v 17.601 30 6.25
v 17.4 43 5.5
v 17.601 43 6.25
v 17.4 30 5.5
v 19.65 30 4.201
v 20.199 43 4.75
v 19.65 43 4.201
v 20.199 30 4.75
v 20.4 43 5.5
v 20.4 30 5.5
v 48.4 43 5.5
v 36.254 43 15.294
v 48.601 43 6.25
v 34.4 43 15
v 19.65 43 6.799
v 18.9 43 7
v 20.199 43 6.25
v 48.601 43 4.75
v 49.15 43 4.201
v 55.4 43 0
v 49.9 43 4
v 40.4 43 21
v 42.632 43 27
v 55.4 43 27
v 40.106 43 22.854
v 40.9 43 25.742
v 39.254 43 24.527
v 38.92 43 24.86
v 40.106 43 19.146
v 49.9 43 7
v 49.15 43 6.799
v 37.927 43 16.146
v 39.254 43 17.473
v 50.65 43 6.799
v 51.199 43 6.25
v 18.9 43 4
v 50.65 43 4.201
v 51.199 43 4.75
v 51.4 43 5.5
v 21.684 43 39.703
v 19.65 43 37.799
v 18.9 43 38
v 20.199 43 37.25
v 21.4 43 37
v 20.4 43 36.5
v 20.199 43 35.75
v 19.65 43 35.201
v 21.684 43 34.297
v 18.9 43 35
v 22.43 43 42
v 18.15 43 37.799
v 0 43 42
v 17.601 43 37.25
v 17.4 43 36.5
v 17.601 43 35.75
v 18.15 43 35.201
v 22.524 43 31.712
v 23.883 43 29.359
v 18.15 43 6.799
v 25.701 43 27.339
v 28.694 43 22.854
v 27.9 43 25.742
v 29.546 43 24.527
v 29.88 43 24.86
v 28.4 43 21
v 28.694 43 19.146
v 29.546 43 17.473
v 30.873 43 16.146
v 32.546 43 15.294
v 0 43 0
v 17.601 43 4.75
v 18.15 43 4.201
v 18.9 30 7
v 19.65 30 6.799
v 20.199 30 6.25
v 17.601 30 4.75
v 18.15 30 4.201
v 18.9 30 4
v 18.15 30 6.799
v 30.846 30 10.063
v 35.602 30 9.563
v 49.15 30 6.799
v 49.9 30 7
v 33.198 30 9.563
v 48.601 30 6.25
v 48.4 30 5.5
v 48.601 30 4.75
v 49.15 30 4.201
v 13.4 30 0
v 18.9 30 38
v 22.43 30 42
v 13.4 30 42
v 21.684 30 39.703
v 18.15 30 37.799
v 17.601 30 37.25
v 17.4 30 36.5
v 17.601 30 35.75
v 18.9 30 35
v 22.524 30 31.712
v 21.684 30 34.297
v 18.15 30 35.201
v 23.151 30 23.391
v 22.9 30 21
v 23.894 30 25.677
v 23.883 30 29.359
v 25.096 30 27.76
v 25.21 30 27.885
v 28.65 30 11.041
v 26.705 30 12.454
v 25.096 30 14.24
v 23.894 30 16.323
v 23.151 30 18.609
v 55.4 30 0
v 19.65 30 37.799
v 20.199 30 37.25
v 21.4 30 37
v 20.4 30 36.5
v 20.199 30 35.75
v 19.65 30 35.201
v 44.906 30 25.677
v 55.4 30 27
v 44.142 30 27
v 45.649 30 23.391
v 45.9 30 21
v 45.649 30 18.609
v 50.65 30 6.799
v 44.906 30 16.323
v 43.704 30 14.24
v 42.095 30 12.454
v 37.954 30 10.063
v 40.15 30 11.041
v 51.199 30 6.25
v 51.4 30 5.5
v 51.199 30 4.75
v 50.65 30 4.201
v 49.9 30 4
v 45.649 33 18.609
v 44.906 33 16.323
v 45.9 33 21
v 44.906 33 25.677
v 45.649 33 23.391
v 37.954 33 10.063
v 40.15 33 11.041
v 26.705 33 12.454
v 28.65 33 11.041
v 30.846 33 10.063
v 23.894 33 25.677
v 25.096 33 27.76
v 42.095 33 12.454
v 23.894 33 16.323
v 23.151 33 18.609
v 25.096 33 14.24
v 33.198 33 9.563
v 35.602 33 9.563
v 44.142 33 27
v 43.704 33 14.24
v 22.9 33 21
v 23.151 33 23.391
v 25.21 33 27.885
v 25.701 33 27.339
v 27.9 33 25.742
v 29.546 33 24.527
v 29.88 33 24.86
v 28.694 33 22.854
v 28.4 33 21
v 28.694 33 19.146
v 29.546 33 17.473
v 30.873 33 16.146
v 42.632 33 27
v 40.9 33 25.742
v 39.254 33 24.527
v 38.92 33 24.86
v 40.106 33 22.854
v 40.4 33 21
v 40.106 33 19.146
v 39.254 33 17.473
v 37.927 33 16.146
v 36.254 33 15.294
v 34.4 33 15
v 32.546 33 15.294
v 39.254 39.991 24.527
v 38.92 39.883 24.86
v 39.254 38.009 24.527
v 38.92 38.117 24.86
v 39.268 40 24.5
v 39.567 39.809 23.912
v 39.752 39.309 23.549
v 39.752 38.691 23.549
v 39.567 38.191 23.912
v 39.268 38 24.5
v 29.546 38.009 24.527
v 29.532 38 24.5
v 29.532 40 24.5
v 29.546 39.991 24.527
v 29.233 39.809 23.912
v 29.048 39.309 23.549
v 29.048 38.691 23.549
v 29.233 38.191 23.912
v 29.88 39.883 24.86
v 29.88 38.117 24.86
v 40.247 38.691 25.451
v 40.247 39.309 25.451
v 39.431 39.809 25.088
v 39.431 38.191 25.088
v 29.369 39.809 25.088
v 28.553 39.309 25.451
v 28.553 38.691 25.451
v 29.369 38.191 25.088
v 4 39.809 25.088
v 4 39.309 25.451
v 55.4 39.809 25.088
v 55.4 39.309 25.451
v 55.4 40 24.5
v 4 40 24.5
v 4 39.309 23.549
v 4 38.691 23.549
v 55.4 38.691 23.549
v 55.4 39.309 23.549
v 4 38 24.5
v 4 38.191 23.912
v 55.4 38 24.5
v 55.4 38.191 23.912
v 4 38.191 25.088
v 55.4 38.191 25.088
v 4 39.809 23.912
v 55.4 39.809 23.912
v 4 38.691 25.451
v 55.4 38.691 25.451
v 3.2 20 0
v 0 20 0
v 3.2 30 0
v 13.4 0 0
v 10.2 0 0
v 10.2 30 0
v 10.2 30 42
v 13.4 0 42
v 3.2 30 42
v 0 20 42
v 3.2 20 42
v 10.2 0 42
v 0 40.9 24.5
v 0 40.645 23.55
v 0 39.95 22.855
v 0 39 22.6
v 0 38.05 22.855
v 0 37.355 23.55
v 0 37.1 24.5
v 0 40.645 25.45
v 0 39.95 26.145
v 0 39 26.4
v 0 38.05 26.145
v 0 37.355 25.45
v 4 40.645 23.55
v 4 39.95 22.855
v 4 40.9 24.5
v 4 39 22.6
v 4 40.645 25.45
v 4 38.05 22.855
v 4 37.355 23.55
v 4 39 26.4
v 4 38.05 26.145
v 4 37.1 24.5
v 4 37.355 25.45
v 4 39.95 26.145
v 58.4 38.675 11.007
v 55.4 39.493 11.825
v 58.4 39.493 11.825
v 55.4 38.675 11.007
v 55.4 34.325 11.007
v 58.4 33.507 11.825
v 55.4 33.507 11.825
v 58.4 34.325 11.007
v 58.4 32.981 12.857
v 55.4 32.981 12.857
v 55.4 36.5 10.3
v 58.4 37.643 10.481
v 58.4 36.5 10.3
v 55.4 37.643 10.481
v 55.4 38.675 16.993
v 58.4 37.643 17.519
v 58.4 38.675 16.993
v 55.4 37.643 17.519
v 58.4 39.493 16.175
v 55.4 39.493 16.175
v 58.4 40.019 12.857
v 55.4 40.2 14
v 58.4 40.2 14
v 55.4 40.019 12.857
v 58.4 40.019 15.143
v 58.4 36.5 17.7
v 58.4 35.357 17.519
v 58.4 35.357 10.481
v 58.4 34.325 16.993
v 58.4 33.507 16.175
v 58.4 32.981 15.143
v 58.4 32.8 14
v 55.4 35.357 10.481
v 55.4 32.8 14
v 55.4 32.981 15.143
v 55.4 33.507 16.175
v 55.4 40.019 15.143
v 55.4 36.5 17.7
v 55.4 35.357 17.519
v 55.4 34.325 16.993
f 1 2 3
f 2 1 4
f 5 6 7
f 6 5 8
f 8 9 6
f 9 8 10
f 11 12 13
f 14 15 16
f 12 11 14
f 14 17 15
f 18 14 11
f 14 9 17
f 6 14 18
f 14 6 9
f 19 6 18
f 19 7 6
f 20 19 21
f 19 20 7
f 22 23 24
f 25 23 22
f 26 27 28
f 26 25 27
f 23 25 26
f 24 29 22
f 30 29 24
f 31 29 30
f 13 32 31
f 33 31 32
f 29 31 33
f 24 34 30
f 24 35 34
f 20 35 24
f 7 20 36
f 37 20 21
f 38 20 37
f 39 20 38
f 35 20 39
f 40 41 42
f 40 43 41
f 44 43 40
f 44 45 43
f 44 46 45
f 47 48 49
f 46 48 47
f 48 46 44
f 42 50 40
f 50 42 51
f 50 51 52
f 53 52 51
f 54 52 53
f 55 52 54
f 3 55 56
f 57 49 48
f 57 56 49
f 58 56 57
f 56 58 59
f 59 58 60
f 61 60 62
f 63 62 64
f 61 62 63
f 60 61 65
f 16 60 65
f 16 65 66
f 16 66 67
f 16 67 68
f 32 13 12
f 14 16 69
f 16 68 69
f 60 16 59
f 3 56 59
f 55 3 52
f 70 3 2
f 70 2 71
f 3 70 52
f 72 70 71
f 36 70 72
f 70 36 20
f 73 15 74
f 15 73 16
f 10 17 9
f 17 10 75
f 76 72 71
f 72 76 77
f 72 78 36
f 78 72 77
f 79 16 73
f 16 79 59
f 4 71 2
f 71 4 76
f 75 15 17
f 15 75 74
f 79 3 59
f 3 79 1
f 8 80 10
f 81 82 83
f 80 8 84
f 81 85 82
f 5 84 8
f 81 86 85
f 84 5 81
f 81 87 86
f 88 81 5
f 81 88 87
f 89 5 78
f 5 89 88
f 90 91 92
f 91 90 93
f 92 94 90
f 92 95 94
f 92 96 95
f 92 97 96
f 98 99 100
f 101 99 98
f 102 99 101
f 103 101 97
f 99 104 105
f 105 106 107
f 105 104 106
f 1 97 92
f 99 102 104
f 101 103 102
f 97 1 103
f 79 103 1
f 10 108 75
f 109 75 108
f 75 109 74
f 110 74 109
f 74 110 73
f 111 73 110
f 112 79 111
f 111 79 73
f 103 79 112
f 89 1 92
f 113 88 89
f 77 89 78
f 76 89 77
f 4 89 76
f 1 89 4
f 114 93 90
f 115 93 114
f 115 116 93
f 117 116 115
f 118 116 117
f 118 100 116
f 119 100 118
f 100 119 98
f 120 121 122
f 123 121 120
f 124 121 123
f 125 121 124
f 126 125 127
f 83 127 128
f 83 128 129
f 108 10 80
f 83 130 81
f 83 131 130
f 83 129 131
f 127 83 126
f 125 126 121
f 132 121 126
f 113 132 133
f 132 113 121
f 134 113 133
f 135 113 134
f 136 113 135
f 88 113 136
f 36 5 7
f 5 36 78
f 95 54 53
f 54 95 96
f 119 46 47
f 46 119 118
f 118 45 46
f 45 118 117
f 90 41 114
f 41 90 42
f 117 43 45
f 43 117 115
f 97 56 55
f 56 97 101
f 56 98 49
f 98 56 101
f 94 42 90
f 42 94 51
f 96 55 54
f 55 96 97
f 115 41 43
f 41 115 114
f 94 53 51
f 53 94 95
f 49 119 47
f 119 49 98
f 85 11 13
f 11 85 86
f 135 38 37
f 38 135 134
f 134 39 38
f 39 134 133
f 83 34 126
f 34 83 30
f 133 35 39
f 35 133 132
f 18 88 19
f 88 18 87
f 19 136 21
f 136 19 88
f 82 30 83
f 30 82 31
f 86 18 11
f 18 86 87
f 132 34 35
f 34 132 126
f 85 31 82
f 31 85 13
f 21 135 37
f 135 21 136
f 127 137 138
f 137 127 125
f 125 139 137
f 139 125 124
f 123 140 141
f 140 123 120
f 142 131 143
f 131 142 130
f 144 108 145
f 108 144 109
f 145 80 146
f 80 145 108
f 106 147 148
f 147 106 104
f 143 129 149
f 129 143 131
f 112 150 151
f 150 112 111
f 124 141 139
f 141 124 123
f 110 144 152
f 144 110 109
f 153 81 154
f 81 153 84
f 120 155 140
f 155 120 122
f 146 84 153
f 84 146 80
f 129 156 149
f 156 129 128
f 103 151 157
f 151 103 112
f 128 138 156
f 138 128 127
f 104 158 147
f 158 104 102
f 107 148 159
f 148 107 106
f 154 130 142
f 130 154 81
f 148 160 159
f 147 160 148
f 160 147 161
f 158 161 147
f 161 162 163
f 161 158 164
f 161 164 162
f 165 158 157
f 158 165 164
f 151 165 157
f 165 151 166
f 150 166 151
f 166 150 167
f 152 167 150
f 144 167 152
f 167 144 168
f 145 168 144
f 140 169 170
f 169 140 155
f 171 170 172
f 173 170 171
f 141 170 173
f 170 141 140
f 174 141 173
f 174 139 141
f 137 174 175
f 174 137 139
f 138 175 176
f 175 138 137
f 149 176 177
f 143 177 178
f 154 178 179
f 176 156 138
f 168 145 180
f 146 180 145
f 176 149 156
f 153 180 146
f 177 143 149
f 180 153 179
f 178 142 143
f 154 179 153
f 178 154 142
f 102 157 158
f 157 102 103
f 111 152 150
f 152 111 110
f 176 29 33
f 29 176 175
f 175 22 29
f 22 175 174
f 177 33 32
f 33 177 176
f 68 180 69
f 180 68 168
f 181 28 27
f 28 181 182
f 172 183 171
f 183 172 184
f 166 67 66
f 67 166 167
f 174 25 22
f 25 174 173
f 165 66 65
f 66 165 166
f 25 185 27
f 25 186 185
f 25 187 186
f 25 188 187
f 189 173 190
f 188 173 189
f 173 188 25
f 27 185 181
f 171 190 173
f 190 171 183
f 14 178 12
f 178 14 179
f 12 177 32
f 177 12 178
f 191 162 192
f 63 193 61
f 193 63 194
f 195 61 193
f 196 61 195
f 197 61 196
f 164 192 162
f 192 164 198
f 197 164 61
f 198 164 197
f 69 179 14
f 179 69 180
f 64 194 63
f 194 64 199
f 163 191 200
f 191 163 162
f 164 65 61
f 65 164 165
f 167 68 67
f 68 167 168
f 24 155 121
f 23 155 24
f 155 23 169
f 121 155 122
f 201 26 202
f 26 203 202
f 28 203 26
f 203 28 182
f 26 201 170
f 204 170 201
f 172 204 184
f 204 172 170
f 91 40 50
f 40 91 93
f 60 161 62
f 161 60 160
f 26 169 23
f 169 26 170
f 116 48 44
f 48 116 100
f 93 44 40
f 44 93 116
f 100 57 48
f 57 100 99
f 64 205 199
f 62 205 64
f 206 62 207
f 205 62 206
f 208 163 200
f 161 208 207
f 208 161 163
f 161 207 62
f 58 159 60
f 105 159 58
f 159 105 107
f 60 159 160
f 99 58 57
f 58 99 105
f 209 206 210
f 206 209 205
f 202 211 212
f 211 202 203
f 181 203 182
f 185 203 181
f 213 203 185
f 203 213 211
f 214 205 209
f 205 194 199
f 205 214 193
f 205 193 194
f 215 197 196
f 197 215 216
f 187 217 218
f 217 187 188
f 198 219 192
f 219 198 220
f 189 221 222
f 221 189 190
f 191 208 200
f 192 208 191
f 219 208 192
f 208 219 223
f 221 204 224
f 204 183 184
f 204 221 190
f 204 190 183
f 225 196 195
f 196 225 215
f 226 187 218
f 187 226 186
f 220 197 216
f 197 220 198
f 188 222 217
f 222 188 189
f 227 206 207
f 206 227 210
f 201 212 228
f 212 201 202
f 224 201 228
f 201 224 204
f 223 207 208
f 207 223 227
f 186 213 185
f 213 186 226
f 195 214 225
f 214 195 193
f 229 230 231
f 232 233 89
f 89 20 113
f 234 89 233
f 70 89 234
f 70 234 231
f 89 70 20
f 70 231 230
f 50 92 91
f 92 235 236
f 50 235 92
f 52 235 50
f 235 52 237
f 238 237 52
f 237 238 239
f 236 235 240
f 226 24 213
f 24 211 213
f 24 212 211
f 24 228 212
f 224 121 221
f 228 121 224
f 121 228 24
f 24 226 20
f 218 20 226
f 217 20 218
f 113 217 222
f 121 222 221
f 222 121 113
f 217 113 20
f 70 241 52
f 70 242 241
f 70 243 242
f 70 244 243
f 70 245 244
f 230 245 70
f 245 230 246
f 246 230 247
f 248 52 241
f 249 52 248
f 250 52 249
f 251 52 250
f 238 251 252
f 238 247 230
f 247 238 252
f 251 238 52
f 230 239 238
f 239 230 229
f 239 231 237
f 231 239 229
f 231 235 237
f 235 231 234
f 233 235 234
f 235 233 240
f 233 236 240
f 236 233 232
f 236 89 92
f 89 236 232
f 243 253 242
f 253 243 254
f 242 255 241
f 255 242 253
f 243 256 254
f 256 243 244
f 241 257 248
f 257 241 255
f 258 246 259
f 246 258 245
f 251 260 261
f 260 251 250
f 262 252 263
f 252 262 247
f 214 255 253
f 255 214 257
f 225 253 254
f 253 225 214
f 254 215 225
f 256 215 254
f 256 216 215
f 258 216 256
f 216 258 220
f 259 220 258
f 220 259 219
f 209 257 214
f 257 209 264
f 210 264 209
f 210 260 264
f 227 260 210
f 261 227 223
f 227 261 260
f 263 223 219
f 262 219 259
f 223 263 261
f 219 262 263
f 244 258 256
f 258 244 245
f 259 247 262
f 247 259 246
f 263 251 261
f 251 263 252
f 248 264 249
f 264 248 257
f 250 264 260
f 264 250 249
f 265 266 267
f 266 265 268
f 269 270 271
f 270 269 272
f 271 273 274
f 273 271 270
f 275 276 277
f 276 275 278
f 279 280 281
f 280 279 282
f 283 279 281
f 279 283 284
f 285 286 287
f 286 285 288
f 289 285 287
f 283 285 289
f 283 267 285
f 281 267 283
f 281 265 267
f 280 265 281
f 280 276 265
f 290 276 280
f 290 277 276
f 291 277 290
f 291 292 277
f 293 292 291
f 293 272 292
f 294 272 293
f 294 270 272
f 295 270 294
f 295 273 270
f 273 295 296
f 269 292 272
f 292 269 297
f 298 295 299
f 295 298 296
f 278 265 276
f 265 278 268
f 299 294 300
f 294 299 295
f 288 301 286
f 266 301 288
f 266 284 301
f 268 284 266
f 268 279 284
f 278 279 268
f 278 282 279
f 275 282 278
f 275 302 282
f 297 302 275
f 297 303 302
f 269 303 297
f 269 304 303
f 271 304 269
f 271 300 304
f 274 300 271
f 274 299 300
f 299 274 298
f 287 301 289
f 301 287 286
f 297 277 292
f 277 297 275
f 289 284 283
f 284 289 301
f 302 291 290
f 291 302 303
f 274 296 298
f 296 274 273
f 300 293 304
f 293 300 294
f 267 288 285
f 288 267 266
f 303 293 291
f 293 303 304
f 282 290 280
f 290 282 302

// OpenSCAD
/*

		A B	  C  D
	| a|b|	c |d |
	 __________ 		_		_E
	|		     |		e		
	|--	 _	-- __|		_-- EM	_
	|	| |	  |			f		 F
	|__	| |	  |			_		_	
		  |	  |			g		 G	
		  |	__|			_		_
								 H

*/

LH = 	0.248;		//layer height
EW = 	0.4;		//extrusion width
a  = 	8 * EW;	 
b	=	7;			//chassis width
c  = 	a;			
d	=	42;
e	=	13;
f	=	10;
g	=	20;
MW  =   42;         //width of mount

	A = a;
	B = a + b;
	C = a + b + c;	
	D = a + b + c + d;

	E = e + f + g;
	F = f + g;
	G = g;
	H = 0;

module x_axis(a,b,c,d,e,f,g){
	A = a;
	B = a + b;
	C = a + b + c;	
	D = a + b + c + d;

	E = e + f + g;
	F = f + g;
	G = g;
	H = 0;

	

	polygon([
		[0,E],
		[D,E],
		[D,F],
		[C,F],
		[C,H],
		[B,H],
		[B,F],
		[A,F],
		[A,G],
		[0,G],
	]);
}

difference(){
	linear_extrude(height=MW) 	x_axis(a,b,c,d,e,f,g); //main body
    
	for (i = [[C+5.5,F,(MW-31)/2],
              [C+5.5,F,(MW-31)/2 + 31],
              [C+5.5+31,F,(MW-31)/2]]){ 
                  
		translate(i) rotate([270,0,0]) 
                  cylinder(e,1.5,1.5, $fn = 12);//motor mount holes
	}
	
    
    translate([C + 5.5 + 31/2, F, MW/2])rotate([270,0,0])
    union(){
        cylinder(3,11.5,11.5, $fn=30); //motor flange
        cylinder(e,6,6, $fn=20);  //hobbed gear
        translate([0,-28,0]) cube(22,18,e); //tensioner arm
        translate([0,-16,0]) cylinder(e,13,13); //tension bearing
        translate([0,-3.5,9]) rotate([0,90,0]) cylinder(100,1,1, center = true, $fn=10); //filament guide
    }
    translate([0,F+9,MW/2 + 3.5]) rotate([0,90,0]) cylinder(4,1.9,1.9, $fn=12);//bowden socket
}
translate([D,F + e/2,14]) rotate([0,90,0]) cylinder(3,3.7,3.7,$fn=20); //spring holder
